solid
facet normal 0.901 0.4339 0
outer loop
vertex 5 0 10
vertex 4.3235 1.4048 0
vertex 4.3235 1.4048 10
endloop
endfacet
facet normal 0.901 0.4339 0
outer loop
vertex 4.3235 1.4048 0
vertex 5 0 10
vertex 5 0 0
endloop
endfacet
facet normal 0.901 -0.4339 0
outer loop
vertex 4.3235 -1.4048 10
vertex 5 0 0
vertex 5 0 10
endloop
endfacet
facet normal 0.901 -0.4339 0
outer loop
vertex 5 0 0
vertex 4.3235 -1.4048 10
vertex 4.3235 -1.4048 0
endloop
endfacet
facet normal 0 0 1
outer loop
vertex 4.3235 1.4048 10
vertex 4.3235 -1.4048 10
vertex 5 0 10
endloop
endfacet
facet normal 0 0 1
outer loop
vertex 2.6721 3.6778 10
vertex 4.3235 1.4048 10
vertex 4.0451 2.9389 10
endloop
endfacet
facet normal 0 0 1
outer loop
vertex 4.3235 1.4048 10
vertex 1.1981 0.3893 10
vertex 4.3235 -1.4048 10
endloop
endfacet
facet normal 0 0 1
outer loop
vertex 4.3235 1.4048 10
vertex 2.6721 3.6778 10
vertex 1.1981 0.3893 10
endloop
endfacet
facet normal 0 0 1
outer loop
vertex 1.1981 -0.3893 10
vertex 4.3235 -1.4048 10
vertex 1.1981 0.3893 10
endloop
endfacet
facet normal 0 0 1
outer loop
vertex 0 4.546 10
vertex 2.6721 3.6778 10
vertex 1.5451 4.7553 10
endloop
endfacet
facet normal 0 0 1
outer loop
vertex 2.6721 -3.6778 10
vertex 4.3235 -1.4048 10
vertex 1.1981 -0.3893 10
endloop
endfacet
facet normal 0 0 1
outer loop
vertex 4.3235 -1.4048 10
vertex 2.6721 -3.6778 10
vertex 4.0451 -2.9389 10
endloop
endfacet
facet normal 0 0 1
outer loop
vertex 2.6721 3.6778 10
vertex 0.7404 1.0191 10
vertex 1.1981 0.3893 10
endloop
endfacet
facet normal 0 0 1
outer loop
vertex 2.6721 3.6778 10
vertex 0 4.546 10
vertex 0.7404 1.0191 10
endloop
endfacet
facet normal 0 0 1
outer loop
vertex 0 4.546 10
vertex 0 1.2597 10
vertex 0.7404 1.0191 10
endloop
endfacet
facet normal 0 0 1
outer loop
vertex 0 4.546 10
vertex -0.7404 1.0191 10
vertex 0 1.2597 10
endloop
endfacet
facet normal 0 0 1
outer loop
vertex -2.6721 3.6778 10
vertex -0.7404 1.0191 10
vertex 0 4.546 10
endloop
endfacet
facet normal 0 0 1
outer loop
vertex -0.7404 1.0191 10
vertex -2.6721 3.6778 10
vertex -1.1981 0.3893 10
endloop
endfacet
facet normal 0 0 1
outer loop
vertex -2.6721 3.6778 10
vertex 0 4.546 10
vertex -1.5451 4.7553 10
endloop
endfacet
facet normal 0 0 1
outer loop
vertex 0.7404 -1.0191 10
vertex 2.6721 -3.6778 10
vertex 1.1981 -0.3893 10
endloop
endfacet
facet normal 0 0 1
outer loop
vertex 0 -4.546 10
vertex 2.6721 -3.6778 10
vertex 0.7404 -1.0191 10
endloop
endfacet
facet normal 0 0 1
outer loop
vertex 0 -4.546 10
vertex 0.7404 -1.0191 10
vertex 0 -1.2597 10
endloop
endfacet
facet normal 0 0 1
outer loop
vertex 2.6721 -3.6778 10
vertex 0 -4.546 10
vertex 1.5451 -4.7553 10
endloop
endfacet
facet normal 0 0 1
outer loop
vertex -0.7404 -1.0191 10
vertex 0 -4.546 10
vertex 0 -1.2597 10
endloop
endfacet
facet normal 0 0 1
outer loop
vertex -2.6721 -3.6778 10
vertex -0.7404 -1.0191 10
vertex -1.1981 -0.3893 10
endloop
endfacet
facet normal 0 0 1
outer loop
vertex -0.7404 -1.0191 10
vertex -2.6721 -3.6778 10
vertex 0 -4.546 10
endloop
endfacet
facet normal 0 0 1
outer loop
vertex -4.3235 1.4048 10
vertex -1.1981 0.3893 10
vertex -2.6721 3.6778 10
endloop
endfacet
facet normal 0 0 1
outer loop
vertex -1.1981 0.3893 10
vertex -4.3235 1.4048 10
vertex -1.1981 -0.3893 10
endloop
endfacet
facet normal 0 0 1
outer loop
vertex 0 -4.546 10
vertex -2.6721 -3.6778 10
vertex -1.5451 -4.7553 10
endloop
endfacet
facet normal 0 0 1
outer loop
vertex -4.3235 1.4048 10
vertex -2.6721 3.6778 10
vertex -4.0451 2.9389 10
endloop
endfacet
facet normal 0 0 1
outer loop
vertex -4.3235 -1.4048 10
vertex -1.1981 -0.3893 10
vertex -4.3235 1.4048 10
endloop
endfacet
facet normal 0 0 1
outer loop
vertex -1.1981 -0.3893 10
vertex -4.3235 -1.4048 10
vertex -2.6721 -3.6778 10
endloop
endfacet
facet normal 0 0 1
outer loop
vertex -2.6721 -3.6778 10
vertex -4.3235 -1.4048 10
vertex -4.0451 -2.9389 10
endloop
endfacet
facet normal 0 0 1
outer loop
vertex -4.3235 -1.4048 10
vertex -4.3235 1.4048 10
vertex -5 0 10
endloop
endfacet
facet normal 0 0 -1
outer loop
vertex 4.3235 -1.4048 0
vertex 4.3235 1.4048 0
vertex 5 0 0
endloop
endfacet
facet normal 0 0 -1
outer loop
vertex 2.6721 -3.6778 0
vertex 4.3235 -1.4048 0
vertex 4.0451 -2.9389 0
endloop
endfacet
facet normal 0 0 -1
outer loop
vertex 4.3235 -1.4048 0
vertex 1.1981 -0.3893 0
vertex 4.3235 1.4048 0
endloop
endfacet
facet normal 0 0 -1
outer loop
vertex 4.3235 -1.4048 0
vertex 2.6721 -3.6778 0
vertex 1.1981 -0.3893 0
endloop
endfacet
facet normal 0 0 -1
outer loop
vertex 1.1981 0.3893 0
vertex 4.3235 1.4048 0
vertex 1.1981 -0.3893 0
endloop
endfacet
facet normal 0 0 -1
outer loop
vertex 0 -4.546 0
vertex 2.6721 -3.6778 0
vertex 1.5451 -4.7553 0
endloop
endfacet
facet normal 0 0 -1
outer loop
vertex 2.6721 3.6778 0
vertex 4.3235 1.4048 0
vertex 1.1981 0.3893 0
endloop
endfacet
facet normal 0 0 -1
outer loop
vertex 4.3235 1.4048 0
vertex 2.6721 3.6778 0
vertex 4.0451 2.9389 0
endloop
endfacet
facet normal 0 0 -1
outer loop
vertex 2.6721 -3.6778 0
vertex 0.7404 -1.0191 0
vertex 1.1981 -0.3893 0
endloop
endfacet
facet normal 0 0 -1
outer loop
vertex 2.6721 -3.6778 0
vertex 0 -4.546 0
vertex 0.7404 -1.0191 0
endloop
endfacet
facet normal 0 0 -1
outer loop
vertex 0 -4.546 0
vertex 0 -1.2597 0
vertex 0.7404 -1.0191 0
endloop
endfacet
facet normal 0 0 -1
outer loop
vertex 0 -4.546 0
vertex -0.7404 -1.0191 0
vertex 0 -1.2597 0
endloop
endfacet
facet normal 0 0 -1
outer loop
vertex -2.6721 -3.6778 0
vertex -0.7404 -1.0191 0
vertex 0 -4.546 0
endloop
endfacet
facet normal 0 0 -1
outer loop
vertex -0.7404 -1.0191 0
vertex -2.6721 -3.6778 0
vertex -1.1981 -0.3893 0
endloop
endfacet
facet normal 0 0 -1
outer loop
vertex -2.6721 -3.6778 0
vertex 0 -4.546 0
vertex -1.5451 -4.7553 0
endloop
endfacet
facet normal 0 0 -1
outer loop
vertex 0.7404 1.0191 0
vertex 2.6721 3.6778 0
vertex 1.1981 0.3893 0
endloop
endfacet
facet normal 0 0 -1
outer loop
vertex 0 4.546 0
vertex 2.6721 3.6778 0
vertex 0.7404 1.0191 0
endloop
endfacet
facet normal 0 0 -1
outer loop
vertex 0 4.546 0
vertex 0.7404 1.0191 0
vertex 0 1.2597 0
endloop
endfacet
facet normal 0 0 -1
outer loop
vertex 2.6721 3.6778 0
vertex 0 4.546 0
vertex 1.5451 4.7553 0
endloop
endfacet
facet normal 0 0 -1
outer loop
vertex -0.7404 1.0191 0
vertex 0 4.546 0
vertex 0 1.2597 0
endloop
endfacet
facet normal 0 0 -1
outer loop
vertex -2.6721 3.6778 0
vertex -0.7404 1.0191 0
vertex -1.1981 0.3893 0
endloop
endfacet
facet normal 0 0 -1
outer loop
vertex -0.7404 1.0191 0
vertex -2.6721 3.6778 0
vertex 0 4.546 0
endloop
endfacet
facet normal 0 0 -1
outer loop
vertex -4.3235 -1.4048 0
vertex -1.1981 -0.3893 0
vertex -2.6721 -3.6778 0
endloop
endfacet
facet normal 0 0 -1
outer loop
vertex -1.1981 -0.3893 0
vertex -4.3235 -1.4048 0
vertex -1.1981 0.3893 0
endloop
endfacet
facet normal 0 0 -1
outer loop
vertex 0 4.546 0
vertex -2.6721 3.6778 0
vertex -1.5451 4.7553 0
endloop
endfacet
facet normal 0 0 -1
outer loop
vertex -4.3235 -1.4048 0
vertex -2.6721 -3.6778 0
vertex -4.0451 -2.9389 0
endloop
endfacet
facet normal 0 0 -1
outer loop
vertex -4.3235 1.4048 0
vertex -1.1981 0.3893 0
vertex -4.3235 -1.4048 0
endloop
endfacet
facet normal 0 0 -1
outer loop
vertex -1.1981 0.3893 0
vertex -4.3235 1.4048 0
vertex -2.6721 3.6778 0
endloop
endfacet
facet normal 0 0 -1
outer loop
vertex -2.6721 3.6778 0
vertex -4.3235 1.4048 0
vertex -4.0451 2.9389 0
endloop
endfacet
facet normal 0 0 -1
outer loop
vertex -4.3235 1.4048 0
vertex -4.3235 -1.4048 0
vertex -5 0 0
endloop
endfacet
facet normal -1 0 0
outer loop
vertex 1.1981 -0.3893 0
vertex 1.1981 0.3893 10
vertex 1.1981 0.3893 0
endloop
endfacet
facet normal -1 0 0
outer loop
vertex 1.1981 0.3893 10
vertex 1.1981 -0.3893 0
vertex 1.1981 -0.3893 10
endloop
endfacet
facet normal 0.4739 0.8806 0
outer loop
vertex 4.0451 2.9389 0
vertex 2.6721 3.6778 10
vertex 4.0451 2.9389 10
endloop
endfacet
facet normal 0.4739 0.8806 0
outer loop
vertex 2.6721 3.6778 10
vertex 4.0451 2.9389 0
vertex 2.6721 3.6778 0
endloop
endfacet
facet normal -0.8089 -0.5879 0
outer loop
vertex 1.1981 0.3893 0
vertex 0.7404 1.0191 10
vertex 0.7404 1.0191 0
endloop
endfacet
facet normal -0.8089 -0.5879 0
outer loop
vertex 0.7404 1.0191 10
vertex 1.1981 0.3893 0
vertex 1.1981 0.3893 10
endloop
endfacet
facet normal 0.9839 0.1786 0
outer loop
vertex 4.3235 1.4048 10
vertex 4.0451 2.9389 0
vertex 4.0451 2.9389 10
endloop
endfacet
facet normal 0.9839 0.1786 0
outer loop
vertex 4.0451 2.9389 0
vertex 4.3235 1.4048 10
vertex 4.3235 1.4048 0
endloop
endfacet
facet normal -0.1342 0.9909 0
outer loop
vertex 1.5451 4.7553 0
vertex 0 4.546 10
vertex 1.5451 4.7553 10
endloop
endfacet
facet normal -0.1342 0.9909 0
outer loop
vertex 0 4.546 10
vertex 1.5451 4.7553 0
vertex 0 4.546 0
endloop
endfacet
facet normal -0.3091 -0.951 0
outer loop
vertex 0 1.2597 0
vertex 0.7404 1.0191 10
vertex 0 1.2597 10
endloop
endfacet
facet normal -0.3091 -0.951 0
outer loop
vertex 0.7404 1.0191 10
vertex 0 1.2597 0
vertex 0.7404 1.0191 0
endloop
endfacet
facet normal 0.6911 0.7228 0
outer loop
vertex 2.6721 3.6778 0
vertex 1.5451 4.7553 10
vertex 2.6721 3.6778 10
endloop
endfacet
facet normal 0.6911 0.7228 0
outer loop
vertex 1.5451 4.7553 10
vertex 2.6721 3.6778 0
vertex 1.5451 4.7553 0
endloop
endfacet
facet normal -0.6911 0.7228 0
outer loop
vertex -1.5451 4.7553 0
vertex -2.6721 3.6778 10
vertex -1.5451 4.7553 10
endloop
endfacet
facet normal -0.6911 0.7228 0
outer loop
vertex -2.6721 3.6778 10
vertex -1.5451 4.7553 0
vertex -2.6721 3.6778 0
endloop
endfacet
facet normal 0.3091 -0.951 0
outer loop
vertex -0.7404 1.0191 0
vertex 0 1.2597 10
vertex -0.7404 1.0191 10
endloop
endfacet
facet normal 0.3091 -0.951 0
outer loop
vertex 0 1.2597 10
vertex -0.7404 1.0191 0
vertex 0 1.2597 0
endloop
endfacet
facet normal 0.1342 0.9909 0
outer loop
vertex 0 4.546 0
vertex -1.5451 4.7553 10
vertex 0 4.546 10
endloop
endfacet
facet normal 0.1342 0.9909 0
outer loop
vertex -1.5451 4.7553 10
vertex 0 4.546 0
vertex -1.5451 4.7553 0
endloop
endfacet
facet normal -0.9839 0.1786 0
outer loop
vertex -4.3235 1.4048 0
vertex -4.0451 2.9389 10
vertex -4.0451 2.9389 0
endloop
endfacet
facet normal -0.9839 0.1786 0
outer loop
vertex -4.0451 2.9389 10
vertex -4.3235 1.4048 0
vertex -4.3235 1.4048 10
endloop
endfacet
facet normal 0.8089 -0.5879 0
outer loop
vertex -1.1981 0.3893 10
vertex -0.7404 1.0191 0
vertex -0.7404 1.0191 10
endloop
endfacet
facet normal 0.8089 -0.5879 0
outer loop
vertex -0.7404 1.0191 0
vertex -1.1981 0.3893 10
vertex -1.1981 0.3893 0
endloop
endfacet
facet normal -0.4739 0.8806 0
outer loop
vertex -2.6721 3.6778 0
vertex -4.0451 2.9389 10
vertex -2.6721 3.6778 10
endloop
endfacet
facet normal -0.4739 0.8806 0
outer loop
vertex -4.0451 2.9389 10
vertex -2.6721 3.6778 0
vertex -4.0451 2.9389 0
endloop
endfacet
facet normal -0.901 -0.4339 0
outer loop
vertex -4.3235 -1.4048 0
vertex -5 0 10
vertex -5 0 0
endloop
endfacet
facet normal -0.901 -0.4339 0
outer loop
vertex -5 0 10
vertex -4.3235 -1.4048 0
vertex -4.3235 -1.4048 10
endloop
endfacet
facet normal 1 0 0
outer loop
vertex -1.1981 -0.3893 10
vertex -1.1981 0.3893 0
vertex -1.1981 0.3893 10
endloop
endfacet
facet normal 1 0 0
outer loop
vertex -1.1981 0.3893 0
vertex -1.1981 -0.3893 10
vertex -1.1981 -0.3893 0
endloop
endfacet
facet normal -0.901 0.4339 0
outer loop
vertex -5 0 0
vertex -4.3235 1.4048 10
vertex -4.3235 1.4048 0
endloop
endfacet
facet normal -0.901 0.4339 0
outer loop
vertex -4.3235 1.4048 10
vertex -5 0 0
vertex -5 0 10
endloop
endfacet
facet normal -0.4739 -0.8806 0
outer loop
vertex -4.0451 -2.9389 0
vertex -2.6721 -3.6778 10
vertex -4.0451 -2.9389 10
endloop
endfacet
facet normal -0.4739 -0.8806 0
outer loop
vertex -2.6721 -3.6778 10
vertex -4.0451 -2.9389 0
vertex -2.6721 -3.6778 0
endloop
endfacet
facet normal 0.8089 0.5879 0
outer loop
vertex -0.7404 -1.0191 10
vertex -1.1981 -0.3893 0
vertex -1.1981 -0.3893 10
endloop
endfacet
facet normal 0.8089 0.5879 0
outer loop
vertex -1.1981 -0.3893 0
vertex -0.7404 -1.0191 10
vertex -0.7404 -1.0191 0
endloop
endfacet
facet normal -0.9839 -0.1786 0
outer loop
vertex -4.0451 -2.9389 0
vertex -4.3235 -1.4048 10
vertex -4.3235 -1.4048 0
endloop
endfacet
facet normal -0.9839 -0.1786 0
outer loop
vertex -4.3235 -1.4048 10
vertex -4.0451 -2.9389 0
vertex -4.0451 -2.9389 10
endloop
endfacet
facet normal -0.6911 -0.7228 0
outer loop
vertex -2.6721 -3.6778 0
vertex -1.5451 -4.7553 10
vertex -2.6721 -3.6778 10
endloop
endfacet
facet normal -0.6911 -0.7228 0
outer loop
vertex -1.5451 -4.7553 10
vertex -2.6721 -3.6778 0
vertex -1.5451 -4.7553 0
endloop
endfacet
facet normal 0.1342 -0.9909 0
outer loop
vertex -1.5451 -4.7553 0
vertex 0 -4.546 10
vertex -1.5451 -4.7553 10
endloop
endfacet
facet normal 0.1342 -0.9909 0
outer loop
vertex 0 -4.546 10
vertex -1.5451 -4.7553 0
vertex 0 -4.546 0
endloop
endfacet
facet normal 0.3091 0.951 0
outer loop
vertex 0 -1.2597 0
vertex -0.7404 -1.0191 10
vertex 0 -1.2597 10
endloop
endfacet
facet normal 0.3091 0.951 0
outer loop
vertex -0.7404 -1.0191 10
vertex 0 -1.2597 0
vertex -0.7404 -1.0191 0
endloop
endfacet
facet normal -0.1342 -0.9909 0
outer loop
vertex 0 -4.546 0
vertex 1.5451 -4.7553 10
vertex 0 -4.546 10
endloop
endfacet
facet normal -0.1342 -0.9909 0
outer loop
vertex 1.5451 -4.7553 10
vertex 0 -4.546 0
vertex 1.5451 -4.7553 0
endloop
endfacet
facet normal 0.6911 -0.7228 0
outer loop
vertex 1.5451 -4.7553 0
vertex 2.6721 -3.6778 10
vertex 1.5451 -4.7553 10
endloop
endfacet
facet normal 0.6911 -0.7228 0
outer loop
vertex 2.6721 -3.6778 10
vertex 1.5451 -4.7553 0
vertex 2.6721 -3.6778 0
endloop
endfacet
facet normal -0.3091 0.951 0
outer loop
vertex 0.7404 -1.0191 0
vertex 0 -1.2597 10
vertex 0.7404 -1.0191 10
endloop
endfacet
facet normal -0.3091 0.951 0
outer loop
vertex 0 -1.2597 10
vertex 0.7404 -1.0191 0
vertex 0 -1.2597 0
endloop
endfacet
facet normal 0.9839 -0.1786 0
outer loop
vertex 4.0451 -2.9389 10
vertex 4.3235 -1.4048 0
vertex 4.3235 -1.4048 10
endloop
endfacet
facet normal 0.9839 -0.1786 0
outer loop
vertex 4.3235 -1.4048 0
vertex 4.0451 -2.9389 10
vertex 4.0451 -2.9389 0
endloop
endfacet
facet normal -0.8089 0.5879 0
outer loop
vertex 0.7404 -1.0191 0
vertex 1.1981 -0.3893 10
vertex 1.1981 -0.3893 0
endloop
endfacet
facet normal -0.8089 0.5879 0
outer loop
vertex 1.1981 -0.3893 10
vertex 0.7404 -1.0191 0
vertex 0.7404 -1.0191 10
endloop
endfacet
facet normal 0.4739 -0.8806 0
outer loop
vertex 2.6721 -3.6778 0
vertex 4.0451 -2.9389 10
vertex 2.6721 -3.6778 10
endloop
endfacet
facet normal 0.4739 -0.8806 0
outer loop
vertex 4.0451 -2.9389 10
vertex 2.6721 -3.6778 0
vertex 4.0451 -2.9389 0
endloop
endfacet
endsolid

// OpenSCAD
// The exact-geometry audit's case c08 (docs/audits/exact-geometry-rust.md).
// volume: 714.1537126623662
union() for (i = [0:9]) rotate(36*i) translate([3,0,0]) cylinder(r=2, h=10);
